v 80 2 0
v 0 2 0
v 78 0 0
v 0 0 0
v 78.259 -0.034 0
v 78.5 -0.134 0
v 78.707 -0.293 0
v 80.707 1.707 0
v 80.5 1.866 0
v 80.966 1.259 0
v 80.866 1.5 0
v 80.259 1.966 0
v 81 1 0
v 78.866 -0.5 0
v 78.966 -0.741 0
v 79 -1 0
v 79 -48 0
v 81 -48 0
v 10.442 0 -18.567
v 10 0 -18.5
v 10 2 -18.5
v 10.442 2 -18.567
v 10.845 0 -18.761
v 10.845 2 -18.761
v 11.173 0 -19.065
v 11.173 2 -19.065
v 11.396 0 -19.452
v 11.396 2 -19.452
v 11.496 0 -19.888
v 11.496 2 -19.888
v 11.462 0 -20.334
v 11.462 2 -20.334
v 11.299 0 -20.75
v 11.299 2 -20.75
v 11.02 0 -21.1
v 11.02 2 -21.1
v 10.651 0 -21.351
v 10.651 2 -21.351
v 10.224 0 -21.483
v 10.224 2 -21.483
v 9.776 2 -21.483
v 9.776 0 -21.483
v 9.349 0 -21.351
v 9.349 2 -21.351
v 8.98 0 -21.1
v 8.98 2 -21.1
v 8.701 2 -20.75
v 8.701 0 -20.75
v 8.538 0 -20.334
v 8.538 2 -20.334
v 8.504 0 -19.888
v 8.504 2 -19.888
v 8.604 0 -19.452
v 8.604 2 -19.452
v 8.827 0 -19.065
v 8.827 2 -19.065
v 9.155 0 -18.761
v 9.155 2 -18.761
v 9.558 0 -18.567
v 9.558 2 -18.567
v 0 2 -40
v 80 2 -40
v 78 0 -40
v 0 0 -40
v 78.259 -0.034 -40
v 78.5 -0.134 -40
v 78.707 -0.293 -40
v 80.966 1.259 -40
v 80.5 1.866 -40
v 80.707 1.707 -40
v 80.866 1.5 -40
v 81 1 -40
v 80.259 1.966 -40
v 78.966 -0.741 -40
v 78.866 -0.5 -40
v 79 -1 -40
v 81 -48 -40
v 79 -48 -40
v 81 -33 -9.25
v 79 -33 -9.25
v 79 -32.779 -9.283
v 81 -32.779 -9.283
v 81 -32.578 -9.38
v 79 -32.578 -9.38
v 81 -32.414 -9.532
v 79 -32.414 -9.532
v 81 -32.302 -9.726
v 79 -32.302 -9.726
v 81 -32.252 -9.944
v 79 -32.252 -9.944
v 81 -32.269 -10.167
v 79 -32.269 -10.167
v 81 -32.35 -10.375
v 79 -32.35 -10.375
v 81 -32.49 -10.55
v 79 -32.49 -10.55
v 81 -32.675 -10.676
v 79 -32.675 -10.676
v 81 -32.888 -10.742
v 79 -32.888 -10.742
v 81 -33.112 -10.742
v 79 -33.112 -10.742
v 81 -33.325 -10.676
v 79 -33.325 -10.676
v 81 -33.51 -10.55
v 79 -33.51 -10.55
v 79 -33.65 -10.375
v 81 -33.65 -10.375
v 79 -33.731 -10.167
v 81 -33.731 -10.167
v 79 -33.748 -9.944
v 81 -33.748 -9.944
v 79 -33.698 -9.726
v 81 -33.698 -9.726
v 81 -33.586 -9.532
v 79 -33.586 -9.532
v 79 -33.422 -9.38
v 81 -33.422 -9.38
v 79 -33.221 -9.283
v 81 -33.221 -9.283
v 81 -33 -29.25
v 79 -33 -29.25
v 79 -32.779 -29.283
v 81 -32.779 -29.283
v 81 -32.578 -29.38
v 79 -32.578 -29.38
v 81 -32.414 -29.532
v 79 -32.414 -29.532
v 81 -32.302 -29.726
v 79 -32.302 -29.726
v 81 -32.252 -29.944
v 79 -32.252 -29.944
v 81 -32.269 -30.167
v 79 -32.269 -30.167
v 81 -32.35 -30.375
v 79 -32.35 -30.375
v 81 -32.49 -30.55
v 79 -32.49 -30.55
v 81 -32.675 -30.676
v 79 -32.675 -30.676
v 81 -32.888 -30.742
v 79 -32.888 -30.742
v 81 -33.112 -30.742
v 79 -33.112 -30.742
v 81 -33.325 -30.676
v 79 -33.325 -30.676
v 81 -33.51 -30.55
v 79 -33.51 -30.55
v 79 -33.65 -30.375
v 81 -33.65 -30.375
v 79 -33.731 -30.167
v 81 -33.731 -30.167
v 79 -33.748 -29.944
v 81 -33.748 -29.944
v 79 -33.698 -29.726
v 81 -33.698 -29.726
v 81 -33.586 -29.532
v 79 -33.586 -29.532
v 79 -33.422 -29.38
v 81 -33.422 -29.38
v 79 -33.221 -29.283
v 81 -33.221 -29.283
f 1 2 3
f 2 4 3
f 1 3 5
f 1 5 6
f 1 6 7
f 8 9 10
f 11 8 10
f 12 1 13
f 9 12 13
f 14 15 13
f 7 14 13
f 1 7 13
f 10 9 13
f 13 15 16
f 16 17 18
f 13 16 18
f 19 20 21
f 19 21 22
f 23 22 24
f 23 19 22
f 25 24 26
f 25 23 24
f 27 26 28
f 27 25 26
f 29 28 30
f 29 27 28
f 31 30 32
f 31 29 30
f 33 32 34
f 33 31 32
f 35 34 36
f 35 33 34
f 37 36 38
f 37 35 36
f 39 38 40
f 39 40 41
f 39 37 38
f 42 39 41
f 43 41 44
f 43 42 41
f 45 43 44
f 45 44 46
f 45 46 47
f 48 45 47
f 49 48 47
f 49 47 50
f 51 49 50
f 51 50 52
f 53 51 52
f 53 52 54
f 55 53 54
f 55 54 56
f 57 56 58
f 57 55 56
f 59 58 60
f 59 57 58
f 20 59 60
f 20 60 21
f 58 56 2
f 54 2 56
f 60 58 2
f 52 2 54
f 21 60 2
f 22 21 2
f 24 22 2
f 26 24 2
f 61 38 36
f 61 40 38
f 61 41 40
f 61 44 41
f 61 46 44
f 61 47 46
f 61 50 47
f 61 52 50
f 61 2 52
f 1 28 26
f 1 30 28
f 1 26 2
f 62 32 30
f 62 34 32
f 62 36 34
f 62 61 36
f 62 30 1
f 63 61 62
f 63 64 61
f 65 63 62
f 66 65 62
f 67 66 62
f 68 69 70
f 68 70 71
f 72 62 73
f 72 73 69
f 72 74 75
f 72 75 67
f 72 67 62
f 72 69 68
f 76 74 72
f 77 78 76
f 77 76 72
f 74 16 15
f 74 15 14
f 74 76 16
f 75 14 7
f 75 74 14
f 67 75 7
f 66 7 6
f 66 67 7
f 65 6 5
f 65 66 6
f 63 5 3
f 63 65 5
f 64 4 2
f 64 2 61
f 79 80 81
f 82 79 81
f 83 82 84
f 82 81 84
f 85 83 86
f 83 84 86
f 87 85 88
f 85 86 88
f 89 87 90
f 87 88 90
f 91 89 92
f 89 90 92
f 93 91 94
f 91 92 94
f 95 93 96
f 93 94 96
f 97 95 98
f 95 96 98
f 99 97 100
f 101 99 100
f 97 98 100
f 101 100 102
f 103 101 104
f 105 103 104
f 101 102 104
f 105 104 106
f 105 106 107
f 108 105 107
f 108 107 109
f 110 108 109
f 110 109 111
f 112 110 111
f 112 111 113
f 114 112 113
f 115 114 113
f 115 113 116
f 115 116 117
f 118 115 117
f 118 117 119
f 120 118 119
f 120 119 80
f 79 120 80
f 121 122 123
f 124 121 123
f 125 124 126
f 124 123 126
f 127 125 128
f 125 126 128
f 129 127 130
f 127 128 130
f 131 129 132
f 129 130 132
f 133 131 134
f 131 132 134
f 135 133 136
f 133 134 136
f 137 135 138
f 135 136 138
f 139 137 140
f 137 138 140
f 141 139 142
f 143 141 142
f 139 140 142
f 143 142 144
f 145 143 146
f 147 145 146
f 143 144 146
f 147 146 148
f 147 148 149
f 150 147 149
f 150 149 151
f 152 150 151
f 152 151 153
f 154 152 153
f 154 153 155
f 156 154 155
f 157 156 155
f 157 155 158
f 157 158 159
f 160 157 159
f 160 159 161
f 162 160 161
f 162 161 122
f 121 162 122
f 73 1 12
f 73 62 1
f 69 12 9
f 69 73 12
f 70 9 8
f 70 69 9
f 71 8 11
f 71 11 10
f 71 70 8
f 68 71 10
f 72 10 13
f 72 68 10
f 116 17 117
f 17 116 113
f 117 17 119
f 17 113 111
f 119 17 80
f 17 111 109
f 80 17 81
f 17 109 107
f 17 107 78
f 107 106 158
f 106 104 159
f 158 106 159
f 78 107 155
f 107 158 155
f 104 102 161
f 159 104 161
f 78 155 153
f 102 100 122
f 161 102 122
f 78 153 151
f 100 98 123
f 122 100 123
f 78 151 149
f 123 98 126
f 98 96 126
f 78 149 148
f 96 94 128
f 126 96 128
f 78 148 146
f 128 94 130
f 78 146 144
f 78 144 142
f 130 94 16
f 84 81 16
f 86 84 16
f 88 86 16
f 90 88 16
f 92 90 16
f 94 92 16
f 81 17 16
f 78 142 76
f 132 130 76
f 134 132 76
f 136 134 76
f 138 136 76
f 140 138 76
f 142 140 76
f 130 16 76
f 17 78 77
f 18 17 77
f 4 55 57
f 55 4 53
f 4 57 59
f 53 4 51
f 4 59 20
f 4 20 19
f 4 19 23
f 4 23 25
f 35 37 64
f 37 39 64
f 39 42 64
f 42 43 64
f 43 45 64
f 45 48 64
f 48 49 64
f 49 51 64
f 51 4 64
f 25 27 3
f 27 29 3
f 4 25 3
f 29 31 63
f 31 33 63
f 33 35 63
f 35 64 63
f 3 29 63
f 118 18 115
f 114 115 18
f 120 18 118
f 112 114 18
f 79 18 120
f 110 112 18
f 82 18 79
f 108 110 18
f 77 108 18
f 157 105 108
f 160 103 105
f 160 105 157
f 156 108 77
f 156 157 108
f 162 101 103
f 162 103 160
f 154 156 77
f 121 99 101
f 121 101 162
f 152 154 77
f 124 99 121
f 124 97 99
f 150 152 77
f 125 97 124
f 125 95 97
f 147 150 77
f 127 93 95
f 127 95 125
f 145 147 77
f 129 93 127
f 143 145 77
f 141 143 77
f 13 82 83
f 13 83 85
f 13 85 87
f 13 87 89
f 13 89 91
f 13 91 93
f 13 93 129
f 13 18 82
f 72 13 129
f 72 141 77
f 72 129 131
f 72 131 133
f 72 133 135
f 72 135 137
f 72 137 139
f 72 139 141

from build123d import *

# Parameters (mm, degrees)
SKETCH1_W           = 80
SKETCH1_H           = 40
SKETCH1_R           = 1.5
BOSS_EXTRUDE1_DEPTH = 2
SKETCH2_W           = 1
SKETCH2_H           = 40
BOSS_EXTRUDE2_DEPTH = 50
SKETCH3_R           = 0.75
CUT_EXTRUDE1_DEPTH  = 70
FILLET1_R           = 1


with BuildPart() as part:
    # Sketch1 → Boss-Extrude1 (new body)
    with BuildSketch(Plane(origin=(0, 0, 0), x_dir=(1, 0, 0), z_dir=(0, 1, 0))):
        with Locations((40, 20)):
            Rectangle(SKETCH1_W, SKETCH1_H)
        with Locations(Location((10, 20, 0), (0, 0, 270))):
            Circle(SKETCH1_R, mode=Mode.SUBTRACT)
    extrude(amount=BOSS_EXTRUDE1_DEPTH)

    # Sketch2 → Boss-Extrude2 (add)
    with BuildSketch(Plane(origin=(0, 2, 0), x_dir=(1, 0, 0), z_dir=(0, 1, 0))):
        with Locations((79.5, 20)):
            Rectangle(SKETCH2_W, SKETCH2_H)
        with Locations((80.5, 20)):
            Rectangle(SKETCH2_W, SKETCH2_H)
    extrude(amount=-BOSS_EXTRUDE2_DEPTH)

    # Sketch3 → Cut-Extrude1 (cut)
    with BuildSketch(Plane.ZY.offset(-79)):
        with Locations((-30, -33)):
            Circle(SKETCH3_R)
        with Locations((-10, -33)):
            Circle(SKETCH3_R)
    extrude(amount=-CUT_EXTRUDE1_DEPTH, mode=Mode.SUBTRACT)

    # Fillet1
    fillet1_edges = [part.edges().sort_by_distance(p)[0] for p in [
        (79, 0, -20),
        (81, 2, -20),
    ]]
    fillet(fillet1_edges, radius=FILLET1_R)


solid = part.part
